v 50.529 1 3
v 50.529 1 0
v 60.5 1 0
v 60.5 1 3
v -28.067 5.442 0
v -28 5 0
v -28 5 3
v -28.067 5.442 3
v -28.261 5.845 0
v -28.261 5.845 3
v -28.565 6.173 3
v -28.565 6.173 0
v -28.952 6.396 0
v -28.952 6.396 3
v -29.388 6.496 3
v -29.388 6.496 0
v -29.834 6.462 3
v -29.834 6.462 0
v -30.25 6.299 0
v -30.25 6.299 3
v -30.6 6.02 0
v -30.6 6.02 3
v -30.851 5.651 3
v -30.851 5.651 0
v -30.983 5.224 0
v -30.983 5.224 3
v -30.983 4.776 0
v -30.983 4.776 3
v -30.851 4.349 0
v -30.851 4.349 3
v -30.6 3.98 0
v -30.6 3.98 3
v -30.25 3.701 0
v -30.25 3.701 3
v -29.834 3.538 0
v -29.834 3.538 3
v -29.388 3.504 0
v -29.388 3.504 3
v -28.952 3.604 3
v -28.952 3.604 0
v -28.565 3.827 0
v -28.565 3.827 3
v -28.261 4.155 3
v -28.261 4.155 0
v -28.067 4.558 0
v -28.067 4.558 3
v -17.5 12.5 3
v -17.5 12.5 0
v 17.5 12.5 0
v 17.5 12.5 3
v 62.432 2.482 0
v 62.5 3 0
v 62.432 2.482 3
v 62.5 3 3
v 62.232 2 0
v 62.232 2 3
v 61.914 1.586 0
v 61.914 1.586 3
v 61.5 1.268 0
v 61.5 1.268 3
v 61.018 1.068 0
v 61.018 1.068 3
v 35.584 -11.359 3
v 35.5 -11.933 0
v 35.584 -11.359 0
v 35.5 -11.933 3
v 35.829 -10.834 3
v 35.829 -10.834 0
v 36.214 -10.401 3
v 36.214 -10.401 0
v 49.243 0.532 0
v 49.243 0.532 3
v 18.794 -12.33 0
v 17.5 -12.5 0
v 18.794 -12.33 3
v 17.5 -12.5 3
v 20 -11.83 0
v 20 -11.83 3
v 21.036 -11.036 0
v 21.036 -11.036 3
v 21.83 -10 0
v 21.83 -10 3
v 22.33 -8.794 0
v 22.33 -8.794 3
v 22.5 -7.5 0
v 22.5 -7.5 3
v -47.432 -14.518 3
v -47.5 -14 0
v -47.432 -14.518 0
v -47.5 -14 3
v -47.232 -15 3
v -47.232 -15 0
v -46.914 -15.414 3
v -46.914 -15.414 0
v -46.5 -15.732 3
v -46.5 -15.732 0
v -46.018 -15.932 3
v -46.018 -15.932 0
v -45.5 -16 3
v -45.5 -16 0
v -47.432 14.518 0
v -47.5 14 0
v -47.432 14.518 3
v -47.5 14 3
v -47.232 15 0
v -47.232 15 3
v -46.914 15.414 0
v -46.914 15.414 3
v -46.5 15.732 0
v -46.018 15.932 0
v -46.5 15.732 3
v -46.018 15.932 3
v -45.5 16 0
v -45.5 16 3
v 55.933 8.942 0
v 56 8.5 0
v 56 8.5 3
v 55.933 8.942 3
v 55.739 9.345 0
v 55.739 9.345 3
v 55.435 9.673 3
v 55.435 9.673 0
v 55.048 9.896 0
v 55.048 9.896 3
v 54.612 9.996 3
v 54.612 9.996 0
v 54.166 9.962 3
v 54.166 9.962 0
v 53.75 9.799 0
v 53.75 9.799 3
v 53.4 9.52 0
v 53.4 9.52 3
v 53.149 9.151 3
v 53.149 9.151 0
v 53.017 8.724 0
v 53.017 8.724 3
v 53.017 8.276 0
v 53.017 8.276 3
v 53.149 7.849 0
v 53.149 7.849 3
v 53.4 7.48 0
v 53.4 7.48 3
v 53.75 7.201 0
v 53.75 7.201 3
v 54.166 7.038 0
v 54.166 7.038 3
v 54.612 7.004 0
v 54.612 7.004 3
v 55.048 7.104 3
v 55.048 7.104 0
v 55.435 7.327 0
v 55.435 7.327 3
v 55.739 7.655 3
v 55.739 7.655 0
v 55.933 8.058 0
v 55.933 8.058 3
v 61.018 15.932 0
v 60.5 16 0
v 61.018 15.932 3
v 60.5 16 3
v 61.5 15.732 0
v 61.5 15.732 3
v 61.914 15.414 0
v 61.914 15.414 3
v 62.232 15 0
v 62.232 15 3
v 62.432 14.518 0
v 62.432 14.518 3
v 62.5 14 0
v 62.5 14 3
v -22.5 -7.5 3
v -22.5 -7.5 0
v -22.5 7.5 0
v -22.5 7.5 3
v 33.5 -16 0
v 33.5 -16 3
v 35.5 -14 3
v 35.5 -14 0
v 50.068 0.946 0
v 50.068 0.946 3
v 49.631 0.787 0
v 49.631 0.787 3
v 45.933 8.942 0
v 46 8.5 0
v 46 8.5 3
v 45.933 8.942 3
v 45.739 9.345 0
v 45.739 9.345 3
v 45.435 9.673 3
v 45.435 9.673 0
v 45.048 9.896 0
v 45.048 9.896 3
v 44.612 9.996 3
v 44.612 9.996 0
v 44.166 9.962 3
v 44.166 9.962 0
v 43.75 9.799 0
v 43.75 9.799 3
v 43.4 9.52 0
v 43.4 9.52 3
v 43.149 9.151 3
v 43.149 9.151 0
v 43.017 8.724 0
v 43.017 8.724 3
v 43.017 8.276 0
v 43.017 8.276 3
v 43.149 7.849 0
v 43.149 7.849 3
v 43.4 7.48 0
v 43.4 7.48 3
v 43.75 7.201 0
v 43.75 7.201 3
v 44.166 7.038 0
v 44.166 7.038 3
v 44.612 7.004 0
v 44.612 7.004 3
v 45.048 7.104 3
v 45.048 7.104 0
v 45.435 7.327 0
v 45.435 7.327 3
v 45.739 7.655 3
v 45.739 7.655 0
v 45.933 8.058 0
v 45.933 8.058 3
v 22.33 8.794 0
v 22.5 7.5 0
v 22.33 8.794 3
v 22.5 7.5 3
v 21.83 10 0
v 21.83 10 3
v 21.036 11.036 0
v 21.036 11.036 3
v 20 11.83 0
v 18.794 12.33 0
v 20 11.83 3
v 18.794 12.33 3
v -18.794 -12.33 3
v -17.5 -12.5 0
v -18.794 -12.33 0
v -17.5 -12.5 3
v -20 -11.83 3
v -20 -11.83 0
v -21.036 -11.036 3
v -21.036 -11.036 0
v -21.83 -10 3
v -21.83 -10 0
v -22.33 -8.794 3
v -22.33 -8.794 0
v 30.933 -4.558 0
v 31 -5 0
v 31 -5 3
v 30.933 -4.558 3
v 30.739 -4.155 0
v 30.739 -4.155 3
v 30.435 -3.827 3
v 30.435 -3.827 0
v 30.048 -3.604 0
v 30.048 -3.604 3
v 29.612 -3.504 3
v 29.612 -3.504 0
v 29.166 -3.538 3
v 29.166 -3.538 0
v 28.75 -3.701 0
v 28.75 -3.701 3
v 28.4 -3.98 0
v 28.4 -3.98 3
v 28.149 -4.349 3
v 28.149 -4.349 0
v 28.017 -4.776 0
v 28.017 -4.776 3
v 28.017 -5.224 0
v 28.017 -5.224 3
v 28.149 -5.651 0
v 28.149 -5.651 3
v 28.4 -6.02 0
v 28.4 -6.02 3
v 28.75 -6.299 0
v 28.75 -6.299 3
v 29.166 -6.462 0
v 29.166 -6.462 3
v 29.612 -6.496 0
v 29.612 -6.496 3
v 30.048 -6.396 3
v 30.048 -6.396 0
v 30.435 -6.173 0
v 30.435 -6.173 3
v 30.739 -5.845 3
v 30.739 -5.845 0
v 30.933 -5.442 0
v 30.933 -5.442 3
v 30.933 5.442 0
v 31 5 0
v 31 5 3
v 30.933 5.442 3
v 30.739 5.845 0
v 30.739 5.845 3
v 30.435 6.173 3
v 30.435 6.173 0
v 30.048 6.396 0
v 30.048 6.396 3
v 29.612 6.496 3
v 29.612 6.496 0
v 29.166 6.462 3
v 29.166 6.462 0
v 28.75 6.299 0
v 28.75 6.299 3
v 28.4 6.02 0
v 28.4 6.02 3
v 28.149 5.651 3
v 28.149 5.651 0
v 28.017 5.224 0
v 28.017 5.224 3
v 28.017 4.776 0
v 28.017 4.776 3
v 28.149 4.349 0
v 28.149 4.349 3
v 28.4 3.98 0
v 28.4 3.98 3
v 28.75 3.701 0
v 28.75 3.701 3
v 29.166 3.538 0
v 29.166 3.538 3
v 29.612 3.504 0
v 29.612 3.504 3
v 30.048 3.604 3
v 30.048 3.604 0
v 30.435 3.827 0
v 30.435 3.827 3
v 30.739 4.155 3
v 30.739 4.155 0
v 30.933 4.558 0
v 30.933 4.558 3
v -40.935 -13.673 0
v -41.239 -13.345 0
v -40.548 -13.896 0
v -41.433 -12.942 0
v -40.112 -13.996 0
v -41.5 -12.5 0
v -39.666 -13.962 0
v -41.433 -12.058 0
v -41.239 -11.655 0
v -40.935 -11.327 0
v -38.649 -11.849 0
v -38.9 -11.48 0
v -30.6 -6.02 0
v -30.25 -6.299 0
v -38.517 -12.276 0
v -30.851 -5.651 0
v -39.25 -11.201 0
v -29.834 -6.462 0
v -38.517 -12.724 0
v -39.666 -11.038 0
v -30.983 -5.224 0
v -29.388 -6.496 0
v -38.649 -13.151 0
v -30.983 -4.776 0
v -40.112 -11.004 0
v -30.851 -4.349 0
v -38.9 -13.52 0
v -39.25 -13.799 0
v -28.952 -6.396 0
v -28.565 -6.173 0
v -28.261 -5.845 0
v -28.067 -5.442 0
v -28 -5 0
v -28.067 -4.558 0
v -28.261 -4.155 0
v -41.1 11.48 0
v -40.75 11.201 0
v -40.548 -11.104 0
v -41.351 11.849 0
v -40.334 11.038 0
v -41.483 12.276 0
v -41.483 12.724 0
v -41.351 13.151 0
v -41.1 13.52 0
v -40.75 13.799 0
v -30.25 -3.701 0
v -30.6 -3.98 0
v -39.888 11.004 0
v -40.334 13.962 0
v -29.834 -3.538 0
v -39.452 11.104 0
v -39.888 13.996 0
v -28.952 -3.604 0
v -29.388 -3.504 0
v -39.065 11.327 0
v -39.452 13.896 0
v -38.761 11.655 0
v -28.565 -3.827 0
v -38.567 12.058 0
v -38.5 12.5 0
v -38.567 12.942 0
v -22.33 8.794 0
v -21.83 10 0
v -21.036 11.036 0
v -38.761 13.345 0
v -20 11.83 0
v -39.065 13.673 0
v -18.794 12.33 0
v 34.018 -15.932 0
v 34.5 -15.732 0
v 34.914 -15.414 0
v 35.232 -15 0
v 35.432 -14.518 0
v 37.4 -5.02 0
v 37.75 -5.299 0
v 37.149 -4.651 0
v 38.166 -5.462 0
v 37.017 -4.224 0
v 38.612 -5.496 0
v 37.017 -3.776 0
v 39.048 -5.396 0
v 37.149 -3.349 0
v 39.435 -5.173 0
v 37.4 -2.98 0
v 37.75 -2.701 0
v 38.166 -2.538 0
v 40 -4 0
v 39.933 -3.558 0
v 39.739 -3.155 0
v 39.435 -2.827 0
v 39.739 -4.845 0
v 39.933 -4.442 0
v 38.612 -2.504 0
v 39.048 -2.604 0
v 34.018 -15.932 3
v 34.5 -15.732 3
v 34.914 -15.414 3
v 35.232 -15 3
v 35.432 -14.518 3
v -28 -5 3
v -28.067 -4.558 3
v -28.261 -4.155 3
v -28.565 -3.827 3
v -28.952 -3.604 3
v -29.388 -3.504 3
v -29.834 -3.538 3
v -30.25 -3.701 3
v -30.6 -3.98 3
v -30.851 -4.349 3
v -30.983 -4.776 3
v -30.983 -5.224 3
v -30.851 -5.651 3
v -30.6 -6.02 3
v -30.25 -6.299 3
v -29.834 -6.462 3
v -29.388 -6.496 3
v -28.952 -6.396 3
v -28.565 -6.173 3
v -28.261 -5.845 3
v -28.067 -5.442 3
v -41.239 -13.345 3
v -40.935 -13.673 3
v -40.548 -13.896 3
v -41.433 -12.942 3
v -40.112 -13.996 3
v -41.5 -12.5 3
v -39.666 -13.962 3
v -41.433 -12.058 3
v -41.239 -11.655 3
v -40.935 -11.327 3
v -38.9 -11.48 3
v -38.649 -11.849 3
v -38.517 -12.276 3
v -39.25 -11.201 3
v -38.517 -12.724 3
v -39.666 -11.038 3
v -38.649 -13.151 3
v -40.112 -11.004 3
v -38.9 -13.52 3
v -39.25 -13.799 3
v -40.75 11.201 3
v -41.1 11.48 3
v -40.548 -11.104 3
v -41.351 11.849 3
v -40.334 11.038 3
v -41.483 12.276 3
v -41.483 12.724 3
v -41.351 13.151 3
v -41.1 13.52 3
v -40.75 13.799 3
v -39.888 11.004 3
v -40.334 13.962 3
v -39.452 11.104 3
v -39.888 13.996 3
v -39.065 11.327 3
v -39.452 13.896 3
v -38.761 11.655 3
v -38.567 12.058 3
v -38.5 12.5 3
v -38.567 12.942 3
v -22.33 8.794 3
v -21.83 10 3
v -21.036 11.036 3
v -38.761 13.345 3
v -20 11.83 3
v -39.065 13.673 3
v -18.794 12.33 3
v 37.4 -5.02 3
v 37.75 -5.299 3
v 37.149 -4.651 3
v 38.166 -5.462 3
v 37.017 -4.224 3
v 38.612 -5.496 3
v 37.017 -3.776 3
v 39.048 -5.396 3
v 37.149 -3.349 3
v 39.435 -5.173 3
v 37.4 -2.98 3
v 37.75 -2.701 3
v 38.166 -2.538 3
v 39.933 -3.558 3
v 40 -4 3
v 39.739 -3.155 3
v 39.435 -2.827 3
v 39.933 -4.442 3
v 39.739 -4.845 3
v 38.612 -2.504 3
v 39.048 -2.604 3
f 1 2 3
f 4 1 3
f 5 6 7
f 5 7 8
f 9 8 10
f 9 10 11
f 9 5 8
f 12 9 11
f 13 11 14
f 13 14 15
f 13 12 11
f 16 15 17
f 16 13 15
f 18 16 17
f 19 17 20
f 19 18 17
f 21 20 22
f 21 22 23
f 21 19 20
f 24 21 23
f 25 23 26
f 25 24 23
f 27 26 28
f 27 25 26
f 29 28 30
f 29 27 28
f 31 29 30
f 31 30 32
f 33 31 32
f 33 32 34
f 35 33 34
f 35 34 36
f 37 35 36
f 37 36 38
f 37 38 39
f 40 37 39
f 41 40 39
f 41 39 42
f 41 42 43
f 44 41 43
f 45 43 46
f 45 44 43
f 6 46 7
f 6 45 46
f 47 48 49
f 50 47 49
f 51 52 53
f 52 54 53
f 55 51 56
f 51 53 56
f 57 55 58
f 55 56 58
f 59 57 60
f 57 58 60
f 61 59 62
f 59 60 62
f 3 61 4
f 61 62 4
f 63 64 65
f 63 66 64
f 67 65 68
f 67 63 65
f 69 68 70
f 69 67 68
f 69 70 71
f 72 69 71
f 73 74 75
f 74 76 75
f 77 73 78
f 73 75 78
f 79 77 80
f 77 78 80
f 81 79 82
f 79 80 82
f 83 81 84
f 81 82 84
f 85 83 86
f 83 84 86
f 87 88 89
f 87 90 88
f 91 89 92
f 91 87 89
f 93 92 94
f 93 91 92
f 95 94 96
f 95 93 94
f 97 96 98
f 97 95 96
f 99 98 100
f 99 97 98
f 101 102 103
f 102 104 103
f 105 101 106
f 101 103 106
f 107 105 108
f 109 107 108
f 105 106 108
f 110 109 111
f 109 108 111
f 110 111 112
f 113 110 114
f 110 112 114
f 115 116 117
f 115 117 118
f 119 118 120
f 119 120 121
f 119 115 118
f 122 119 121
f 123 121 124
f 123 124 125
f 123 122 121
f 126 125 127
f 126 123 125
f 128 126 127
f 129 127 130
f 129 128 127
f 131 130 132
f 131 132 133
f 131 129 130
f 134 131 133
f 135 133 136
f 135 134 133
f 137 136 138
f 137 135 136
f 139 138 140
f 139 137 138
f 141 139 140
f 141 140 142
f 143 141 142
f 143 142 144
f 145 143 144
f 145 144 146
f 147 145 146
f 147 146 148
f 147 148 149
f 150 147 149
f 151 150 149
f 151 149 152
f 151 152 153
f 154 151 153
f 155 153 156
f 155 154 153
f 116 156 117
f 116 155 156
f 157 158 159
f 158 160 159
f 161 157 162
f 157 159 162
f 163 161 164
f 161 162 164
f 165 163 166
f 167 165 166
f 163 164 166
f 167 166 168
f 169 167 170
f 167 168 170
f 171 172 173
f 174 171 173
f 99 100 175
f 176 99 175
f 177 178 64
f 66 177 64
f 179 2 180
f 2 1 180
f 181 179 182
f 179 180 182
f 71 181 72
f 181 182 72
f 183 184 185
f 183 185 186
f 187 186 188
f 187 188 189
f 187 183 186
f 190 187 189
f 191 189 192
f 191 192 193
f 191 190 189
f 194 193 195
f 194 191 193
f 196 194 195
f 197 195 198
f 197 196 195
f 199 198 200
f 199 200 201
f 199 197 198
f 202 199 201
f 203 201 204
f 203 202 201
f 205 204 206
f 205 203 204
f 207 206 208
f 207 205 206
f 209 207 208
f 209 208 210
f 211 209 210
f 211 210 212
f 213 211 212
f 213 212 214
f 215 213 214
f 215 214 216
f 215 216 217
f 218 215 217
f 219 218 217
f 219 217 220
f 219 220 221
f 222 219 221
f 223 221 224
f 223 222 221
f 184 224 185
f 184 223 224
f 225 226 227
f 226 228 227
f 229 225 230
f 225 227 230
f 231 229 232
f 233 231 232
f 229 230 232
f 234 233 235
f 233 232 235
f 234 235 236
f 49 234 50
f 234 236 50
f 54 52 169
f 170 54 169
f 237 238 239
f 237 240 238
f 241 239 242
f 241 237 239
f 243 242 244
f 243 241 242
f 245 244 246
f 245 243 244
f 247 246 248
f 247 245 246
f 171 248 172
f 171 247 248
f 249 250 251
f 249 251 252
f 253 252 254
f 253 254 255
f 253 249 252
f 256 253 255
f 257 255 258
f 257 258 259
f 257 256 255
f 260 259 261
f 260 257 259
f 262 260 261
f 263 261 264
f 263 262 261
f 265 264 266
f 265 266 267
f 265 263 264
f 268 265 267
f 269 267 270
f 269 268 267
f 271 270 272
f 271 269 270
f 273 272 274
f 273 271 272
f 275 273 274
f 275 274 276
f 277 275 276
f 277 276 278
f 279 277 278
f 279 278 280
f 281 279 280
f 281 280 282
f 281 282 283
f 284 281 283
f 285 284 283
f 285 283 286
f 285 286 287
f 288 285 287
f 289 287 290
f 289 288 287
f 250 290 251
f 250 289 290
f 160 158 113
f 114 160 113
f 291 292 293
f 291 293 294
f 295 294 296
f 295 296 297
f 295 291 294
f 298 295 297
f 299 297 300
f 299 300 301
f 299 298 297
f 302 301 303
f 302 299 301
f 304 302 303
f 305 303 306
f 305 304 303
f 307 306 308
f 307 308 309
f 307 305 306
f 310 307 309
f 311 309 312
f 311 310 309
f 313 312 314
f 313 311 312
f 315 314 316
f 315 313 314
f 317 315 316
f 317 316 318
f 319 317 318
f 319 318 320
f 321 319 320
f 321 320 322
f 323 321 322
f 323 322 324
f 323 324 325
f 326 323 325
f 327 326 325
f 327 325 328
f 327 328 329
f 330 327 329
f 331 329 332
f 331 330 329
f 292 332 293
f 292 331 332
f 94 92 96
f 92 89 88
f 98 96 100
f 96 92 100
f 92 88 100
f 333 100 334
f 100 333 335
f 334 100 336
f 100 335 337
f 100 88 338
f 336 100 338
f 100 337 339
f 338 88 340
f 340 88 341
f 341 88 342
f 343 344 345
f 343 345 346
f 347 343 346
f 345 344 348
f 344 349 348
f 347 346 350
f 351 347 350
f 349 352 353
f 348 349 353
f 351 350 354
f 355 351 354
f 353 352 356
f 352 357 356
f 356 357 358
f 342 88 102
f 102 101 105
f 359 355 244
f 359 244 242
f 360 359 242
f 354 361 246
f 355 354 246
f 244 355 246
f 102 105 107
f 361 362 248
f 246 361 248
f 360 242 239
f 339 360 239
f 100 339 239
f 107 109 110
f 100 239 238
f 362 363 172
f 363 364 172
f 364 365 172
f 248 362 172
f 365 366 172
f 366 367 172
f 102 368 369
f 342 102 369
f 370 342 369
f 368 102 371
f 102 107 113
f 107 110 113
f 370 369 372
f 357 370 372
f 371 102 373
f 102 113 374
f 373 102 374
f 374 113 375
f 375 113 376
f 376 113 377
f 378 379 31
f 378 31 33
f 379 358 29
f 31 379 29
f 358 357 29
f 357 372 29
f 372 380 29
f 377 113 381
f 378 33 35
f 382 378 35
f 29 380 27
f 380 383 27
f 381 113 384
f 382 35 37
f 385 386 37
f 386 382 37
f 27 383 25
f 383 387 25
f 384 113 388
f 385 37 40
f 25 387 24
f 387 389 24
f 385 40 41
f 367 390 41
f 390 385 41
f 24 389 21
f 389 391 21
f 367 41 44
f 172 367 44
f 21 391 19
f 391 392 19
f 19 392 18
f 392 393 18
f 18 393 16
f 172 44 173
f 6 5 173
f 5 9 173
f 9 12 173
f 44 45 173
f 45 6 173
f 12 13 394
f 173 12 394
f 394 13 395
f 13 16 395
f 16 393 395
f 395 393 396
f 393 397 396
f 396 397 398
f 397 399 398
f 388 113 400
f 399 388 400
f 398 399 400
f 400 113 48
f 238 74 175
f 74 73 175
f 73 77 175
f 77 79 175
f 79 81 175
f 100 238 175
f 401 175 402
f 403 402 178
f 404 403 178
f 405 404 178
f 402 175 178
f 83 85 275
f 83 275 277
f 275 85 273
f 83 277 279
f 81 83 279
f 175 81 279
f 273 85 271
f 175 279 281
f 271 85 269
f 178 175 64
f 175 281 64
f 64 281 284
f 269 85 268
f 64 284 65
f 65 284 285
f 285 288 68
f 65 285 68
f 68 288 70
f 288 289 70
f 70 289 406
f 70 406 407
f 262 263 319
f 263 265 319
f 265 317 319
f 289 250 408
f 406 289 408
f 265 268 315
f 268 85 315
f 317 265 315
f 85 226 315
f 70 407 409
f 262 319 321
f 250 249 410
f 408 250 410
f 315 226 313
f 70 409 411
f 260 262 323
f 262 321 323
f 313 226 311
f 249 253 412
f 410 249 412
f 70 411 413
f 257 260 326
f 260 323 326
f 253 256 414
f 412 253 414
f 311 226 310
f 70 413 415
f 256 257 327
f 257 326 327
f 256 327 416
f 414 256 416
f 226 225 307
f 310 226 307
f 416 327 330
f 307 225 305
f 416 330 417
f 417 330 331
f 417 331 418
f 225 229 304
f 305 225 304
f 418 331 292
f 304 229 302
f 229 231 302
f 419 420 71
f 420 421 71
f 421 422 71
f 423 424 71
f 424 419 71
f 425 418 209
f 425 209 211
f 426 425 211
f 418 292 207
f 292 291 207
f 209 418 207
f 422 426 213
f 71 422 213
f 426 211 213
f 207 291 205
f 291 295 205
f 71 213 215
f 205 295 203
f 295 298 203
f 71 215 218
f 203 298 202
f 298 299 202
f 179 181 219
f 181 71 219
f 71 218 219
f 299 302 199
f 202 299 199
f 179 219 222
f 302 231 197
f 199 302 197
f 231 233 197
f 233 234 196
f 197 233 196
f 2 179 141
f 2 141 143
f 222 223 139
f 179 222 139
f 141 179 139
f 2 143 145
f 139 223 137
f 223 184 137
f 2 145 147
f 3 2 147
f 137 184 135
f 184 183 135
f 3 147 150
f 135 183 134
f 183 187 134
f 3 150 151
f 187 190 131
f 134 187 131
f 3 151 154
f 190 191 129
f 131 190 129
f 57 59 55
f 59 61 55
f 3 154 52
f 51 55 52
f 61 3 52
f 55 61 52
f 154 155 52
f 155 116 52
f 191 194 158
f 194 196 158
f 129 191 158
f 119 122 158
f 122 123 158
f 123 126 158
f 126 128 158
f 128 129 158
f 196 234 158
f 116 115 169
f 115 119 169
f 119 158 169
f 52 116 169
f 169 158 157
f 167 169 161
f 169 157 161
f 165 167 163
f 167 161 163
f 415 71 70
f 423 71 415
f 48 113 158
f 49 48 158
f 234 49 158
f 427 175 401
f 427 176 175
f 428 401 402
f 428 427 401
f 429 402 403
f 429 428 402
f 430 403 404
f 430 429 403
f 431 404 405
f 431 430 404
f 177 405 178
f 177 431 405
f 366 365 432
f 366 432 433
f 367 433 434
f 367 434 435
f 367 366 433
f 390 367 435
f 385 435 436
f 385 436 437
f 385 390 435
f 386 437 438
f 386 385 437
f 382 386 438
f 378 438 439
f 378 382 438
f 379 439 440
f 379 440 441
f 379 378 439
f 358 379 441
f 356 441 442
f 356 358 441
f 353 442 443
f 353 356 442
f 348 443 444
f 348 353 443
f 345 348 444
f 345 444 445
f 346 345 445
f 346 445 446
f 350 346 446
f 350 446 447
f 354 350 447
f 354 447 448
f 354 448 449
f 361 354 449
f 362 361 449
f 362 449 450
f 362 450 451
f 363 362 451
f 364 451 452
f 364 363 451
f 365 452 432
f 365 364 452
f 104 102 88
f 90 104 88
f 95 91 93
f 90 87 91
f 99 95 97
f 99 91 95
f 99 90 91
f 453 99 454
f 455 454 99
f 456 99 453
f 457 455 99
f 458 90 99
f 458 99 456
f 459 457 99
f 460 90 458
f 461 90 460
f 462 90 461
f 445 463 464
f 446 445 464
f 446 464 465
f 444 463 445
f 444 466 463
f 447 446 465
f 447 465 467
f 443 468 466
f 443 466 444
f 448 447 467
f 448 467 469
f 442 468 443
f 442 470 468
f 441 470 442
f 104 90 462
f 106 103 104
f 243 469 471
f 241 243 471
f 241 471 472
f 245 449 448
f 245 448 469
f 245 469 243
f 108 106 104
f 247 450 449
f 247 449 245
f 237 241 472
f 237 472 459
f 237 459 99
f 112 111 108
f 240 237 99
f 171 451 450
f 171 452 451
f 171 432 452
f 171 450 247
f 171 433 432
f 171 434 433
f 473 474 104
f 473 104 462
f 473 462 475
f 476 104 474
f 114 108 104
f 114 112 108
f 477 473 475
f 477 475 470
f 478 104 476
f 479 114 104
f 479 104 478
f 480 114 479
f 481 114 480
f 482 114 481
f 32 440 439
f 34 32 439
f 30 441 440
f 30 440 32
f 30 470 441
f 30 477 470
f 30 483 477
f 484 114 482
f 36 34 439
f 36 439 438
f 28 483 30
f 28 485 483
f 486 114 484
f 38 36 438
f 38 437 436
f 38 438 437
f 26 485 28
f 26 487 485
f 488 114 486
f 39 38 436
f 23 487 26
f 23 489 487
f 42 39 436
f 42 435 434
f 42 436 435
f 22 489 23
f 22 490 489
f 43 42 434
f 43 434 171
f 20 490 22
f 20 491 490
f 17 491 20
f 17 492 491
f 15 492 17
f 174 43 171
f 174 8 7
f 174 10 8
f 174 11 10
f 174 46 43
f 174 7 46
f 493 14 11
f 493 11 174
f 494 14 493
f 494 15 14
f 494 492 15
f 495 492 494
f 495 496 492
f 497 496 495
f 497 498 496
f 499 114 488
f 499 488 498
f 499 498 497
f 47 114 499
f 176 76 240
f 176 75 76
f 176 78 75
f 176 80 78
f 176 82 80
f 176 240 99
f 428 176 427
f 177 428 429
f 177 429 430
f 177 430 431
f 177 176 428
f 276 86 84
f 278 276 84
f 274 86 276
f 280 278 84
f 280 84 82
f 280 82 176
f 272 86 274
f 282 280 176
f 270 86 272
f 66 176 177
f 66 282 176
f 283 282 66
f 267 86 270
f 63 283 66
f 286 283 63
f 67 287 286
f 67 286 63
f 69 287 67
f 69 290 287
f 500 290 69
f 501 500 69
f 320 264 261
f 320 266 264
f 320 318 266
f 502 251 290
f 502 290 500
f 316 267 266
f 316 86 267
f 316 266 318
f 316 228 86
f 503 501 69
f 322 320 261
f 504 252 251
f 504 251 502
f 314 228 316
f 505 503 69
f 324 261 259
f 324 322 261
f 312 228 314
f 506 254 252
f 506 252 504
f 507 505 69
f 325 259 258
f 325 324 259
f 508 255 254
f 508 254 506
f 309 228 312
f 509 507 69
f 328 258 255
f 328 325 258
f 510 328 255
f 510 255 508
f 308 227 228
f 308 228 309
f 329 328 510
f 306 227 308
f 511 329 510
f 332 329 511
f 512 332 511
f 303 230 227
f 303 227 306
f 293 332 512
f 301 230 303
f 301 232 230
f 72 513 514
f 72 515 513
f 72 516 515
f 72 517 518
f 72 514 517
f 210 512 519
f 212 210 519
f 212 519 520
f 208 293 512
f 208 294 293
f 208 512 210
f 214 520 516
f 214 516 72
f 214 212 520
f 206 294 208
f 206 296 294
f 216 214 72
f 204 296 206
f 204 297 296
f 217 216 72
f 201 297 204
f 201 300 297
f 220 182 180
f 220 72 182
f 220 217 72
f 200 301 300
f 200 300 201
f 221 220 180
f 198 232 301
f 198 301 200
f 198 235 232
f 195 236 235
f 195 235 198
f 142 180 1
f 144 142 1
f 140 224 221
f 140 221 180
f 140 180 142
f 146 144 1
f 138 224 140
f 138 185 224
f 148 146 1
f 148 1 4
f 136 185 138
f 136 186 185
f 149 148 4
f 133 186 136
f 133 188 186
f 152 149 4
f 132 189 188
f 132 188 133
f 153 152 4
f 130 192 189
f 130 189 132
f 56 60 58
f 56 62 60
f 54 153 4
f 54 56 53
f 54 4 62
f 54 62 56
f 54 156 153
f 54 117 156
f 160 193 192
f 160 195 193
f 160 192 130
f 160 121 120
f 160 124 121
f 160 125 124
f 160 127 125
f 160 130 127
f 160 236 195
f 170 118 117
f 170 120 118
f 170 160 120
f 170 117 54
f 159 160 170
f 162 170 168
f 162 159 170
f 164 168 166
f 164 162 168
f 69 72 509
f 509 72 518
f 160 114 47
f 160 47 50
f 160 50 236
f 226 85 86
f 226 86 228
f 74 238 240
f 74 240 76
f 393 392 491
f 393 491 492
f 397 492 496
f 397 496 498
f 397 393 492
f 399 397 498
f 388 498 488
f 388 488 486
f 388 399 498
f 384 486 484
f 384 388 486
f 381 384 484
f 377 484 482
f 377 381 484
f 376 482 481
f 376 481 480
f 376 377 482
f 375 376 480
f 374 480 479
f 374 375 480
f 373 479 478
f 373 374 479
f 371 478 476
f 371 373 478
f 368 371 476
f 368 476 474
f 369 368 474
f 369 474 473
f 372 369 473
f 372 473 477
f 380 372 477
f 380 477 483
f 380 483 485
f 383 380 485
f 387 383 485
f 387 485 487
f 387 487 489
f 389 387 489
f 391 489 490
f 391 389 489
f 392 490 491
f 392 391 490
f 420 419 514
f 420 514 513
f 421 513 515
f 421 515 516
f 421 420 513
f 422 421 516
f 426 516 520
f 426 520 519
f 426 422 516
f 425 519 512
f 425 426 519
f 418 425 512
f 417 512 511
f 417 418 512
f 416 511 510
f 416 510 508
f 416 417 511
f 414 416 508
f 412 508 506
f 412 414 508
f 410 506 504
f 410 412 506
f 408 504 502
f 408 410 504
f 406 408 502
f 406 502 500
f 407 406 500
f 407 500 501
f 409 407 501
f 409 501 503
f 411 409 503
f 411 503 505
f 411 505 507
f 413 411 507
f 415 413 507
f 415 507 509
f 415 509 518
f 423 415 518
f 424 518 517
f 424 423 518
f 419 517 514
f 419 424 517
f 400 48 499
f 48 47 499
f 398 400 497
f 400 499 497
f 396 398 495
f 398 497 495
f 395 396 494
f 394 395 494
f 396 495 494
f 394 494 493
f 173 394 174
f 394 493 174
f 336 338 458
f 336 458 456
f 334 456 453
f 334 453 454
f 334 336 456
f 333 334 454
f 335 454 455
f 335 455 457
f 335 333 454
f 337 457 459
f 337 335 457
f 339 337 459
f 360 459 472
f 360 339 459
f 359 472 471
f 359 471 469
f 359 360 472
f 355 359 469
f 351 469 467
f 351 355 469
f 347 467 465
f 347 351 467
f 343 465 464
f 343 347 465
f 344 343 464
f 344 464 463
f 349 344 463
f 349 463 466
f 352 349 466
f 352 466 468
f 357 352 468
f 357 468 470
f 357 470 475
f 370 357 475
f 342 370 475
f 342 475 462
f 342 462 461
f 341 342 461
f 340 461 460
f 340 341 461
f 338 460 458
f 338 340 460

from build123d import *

# Parameters (mm, degrees)
SKETCH_1_R      = 1.5
SKETCH_1_W      = 45
SKETCH_1_H      = 25
EXTRUDE_1_DEPTH = 3
FILLET_1_R      = 2
FILLET_2_R      = 5


with BuildPart() as part:
    # 草图1 → 凸台-拉伸1 (new body)
    with BuildSketch(Plane.XY):
        Polygon((-47.5, 16), (-47.5, -16), (35.5, -16), (35.5, -11), (49.801043111, 1), (62.5, 1), (62.5, 16), (35.5, 16), align=None)
        with Locations((-29.5, 5)):
            Circle(SKETCH_1_R, mode=Mode.SUBTRACT)
        with Locations((-29.5, -5)):
            Circle(SKETCH_1_R, mode=Mode.SUBTRACT)
        with Locations((29.5, 5)):
            Circle(SKETCH_1_R, mode=Mode.SUBTRACT)
        with Locations((29.5, -5)):
            Circle(SKETCH_1_R, mode=Mode.SUBTRACT)
        with Locations((44.5, 8.5)):
            Circle(SKETCH_1_R, mode=Mode.SUBTRACT)
        with Locations((54.5, 8.5)):
            Circle(SKETCH_1_R, mode=Mode.SUBTRACT)
        with Locations((-40, 12.5)):
            Circle(SKETCH_1_R, mode=Mode.SUBTRACT)
        with Locations(Location((-40, -12.5, 0), (0, 0, 180))):
            Circle(SKETCH_1_R, mode=Mode.SUBTRACT)
        with Locations((38.5, -4)):
            Circle(SKETCH_1_R, mode=Mode.SUBTRACT)
        Rectangle(SKETCH_1_W, SKETCH_1_H, mode=Mode.SUBTRACT)
    extrude(amount=EXTRUDE_1_DEPTH)

    # 圆角1
    fillet_1_edges = [part.edges().sort_by_distance(p)[0] for p in [
        (62.5, 16, 1.5),
        (62.5, 1, 1.5),
        (49.801043111, 1, 1.5),
        (35.5, -11, 1.5),
        (35.5, -16, 1.5),
        (-47.5, -16, 1.5),
        (-47.5, 16, 1.5),
    ]]
    fillet(fillet_1_edges, radius=FILLET_1_R)

    # 圆角2
    fillet_2_edges = [part.edges().sort_by_distance(p)[0] for p in [
        (22.5, -12.5, 1.5),
        (22.5, 12.5, 1.5),
        (-22.5, 12.5, 1.5),
        (-22.5, -12.5, 1.5),
    ]]
    fillet(fillet_2_edges, radius=FILLET_2_R)


solid = part.part
